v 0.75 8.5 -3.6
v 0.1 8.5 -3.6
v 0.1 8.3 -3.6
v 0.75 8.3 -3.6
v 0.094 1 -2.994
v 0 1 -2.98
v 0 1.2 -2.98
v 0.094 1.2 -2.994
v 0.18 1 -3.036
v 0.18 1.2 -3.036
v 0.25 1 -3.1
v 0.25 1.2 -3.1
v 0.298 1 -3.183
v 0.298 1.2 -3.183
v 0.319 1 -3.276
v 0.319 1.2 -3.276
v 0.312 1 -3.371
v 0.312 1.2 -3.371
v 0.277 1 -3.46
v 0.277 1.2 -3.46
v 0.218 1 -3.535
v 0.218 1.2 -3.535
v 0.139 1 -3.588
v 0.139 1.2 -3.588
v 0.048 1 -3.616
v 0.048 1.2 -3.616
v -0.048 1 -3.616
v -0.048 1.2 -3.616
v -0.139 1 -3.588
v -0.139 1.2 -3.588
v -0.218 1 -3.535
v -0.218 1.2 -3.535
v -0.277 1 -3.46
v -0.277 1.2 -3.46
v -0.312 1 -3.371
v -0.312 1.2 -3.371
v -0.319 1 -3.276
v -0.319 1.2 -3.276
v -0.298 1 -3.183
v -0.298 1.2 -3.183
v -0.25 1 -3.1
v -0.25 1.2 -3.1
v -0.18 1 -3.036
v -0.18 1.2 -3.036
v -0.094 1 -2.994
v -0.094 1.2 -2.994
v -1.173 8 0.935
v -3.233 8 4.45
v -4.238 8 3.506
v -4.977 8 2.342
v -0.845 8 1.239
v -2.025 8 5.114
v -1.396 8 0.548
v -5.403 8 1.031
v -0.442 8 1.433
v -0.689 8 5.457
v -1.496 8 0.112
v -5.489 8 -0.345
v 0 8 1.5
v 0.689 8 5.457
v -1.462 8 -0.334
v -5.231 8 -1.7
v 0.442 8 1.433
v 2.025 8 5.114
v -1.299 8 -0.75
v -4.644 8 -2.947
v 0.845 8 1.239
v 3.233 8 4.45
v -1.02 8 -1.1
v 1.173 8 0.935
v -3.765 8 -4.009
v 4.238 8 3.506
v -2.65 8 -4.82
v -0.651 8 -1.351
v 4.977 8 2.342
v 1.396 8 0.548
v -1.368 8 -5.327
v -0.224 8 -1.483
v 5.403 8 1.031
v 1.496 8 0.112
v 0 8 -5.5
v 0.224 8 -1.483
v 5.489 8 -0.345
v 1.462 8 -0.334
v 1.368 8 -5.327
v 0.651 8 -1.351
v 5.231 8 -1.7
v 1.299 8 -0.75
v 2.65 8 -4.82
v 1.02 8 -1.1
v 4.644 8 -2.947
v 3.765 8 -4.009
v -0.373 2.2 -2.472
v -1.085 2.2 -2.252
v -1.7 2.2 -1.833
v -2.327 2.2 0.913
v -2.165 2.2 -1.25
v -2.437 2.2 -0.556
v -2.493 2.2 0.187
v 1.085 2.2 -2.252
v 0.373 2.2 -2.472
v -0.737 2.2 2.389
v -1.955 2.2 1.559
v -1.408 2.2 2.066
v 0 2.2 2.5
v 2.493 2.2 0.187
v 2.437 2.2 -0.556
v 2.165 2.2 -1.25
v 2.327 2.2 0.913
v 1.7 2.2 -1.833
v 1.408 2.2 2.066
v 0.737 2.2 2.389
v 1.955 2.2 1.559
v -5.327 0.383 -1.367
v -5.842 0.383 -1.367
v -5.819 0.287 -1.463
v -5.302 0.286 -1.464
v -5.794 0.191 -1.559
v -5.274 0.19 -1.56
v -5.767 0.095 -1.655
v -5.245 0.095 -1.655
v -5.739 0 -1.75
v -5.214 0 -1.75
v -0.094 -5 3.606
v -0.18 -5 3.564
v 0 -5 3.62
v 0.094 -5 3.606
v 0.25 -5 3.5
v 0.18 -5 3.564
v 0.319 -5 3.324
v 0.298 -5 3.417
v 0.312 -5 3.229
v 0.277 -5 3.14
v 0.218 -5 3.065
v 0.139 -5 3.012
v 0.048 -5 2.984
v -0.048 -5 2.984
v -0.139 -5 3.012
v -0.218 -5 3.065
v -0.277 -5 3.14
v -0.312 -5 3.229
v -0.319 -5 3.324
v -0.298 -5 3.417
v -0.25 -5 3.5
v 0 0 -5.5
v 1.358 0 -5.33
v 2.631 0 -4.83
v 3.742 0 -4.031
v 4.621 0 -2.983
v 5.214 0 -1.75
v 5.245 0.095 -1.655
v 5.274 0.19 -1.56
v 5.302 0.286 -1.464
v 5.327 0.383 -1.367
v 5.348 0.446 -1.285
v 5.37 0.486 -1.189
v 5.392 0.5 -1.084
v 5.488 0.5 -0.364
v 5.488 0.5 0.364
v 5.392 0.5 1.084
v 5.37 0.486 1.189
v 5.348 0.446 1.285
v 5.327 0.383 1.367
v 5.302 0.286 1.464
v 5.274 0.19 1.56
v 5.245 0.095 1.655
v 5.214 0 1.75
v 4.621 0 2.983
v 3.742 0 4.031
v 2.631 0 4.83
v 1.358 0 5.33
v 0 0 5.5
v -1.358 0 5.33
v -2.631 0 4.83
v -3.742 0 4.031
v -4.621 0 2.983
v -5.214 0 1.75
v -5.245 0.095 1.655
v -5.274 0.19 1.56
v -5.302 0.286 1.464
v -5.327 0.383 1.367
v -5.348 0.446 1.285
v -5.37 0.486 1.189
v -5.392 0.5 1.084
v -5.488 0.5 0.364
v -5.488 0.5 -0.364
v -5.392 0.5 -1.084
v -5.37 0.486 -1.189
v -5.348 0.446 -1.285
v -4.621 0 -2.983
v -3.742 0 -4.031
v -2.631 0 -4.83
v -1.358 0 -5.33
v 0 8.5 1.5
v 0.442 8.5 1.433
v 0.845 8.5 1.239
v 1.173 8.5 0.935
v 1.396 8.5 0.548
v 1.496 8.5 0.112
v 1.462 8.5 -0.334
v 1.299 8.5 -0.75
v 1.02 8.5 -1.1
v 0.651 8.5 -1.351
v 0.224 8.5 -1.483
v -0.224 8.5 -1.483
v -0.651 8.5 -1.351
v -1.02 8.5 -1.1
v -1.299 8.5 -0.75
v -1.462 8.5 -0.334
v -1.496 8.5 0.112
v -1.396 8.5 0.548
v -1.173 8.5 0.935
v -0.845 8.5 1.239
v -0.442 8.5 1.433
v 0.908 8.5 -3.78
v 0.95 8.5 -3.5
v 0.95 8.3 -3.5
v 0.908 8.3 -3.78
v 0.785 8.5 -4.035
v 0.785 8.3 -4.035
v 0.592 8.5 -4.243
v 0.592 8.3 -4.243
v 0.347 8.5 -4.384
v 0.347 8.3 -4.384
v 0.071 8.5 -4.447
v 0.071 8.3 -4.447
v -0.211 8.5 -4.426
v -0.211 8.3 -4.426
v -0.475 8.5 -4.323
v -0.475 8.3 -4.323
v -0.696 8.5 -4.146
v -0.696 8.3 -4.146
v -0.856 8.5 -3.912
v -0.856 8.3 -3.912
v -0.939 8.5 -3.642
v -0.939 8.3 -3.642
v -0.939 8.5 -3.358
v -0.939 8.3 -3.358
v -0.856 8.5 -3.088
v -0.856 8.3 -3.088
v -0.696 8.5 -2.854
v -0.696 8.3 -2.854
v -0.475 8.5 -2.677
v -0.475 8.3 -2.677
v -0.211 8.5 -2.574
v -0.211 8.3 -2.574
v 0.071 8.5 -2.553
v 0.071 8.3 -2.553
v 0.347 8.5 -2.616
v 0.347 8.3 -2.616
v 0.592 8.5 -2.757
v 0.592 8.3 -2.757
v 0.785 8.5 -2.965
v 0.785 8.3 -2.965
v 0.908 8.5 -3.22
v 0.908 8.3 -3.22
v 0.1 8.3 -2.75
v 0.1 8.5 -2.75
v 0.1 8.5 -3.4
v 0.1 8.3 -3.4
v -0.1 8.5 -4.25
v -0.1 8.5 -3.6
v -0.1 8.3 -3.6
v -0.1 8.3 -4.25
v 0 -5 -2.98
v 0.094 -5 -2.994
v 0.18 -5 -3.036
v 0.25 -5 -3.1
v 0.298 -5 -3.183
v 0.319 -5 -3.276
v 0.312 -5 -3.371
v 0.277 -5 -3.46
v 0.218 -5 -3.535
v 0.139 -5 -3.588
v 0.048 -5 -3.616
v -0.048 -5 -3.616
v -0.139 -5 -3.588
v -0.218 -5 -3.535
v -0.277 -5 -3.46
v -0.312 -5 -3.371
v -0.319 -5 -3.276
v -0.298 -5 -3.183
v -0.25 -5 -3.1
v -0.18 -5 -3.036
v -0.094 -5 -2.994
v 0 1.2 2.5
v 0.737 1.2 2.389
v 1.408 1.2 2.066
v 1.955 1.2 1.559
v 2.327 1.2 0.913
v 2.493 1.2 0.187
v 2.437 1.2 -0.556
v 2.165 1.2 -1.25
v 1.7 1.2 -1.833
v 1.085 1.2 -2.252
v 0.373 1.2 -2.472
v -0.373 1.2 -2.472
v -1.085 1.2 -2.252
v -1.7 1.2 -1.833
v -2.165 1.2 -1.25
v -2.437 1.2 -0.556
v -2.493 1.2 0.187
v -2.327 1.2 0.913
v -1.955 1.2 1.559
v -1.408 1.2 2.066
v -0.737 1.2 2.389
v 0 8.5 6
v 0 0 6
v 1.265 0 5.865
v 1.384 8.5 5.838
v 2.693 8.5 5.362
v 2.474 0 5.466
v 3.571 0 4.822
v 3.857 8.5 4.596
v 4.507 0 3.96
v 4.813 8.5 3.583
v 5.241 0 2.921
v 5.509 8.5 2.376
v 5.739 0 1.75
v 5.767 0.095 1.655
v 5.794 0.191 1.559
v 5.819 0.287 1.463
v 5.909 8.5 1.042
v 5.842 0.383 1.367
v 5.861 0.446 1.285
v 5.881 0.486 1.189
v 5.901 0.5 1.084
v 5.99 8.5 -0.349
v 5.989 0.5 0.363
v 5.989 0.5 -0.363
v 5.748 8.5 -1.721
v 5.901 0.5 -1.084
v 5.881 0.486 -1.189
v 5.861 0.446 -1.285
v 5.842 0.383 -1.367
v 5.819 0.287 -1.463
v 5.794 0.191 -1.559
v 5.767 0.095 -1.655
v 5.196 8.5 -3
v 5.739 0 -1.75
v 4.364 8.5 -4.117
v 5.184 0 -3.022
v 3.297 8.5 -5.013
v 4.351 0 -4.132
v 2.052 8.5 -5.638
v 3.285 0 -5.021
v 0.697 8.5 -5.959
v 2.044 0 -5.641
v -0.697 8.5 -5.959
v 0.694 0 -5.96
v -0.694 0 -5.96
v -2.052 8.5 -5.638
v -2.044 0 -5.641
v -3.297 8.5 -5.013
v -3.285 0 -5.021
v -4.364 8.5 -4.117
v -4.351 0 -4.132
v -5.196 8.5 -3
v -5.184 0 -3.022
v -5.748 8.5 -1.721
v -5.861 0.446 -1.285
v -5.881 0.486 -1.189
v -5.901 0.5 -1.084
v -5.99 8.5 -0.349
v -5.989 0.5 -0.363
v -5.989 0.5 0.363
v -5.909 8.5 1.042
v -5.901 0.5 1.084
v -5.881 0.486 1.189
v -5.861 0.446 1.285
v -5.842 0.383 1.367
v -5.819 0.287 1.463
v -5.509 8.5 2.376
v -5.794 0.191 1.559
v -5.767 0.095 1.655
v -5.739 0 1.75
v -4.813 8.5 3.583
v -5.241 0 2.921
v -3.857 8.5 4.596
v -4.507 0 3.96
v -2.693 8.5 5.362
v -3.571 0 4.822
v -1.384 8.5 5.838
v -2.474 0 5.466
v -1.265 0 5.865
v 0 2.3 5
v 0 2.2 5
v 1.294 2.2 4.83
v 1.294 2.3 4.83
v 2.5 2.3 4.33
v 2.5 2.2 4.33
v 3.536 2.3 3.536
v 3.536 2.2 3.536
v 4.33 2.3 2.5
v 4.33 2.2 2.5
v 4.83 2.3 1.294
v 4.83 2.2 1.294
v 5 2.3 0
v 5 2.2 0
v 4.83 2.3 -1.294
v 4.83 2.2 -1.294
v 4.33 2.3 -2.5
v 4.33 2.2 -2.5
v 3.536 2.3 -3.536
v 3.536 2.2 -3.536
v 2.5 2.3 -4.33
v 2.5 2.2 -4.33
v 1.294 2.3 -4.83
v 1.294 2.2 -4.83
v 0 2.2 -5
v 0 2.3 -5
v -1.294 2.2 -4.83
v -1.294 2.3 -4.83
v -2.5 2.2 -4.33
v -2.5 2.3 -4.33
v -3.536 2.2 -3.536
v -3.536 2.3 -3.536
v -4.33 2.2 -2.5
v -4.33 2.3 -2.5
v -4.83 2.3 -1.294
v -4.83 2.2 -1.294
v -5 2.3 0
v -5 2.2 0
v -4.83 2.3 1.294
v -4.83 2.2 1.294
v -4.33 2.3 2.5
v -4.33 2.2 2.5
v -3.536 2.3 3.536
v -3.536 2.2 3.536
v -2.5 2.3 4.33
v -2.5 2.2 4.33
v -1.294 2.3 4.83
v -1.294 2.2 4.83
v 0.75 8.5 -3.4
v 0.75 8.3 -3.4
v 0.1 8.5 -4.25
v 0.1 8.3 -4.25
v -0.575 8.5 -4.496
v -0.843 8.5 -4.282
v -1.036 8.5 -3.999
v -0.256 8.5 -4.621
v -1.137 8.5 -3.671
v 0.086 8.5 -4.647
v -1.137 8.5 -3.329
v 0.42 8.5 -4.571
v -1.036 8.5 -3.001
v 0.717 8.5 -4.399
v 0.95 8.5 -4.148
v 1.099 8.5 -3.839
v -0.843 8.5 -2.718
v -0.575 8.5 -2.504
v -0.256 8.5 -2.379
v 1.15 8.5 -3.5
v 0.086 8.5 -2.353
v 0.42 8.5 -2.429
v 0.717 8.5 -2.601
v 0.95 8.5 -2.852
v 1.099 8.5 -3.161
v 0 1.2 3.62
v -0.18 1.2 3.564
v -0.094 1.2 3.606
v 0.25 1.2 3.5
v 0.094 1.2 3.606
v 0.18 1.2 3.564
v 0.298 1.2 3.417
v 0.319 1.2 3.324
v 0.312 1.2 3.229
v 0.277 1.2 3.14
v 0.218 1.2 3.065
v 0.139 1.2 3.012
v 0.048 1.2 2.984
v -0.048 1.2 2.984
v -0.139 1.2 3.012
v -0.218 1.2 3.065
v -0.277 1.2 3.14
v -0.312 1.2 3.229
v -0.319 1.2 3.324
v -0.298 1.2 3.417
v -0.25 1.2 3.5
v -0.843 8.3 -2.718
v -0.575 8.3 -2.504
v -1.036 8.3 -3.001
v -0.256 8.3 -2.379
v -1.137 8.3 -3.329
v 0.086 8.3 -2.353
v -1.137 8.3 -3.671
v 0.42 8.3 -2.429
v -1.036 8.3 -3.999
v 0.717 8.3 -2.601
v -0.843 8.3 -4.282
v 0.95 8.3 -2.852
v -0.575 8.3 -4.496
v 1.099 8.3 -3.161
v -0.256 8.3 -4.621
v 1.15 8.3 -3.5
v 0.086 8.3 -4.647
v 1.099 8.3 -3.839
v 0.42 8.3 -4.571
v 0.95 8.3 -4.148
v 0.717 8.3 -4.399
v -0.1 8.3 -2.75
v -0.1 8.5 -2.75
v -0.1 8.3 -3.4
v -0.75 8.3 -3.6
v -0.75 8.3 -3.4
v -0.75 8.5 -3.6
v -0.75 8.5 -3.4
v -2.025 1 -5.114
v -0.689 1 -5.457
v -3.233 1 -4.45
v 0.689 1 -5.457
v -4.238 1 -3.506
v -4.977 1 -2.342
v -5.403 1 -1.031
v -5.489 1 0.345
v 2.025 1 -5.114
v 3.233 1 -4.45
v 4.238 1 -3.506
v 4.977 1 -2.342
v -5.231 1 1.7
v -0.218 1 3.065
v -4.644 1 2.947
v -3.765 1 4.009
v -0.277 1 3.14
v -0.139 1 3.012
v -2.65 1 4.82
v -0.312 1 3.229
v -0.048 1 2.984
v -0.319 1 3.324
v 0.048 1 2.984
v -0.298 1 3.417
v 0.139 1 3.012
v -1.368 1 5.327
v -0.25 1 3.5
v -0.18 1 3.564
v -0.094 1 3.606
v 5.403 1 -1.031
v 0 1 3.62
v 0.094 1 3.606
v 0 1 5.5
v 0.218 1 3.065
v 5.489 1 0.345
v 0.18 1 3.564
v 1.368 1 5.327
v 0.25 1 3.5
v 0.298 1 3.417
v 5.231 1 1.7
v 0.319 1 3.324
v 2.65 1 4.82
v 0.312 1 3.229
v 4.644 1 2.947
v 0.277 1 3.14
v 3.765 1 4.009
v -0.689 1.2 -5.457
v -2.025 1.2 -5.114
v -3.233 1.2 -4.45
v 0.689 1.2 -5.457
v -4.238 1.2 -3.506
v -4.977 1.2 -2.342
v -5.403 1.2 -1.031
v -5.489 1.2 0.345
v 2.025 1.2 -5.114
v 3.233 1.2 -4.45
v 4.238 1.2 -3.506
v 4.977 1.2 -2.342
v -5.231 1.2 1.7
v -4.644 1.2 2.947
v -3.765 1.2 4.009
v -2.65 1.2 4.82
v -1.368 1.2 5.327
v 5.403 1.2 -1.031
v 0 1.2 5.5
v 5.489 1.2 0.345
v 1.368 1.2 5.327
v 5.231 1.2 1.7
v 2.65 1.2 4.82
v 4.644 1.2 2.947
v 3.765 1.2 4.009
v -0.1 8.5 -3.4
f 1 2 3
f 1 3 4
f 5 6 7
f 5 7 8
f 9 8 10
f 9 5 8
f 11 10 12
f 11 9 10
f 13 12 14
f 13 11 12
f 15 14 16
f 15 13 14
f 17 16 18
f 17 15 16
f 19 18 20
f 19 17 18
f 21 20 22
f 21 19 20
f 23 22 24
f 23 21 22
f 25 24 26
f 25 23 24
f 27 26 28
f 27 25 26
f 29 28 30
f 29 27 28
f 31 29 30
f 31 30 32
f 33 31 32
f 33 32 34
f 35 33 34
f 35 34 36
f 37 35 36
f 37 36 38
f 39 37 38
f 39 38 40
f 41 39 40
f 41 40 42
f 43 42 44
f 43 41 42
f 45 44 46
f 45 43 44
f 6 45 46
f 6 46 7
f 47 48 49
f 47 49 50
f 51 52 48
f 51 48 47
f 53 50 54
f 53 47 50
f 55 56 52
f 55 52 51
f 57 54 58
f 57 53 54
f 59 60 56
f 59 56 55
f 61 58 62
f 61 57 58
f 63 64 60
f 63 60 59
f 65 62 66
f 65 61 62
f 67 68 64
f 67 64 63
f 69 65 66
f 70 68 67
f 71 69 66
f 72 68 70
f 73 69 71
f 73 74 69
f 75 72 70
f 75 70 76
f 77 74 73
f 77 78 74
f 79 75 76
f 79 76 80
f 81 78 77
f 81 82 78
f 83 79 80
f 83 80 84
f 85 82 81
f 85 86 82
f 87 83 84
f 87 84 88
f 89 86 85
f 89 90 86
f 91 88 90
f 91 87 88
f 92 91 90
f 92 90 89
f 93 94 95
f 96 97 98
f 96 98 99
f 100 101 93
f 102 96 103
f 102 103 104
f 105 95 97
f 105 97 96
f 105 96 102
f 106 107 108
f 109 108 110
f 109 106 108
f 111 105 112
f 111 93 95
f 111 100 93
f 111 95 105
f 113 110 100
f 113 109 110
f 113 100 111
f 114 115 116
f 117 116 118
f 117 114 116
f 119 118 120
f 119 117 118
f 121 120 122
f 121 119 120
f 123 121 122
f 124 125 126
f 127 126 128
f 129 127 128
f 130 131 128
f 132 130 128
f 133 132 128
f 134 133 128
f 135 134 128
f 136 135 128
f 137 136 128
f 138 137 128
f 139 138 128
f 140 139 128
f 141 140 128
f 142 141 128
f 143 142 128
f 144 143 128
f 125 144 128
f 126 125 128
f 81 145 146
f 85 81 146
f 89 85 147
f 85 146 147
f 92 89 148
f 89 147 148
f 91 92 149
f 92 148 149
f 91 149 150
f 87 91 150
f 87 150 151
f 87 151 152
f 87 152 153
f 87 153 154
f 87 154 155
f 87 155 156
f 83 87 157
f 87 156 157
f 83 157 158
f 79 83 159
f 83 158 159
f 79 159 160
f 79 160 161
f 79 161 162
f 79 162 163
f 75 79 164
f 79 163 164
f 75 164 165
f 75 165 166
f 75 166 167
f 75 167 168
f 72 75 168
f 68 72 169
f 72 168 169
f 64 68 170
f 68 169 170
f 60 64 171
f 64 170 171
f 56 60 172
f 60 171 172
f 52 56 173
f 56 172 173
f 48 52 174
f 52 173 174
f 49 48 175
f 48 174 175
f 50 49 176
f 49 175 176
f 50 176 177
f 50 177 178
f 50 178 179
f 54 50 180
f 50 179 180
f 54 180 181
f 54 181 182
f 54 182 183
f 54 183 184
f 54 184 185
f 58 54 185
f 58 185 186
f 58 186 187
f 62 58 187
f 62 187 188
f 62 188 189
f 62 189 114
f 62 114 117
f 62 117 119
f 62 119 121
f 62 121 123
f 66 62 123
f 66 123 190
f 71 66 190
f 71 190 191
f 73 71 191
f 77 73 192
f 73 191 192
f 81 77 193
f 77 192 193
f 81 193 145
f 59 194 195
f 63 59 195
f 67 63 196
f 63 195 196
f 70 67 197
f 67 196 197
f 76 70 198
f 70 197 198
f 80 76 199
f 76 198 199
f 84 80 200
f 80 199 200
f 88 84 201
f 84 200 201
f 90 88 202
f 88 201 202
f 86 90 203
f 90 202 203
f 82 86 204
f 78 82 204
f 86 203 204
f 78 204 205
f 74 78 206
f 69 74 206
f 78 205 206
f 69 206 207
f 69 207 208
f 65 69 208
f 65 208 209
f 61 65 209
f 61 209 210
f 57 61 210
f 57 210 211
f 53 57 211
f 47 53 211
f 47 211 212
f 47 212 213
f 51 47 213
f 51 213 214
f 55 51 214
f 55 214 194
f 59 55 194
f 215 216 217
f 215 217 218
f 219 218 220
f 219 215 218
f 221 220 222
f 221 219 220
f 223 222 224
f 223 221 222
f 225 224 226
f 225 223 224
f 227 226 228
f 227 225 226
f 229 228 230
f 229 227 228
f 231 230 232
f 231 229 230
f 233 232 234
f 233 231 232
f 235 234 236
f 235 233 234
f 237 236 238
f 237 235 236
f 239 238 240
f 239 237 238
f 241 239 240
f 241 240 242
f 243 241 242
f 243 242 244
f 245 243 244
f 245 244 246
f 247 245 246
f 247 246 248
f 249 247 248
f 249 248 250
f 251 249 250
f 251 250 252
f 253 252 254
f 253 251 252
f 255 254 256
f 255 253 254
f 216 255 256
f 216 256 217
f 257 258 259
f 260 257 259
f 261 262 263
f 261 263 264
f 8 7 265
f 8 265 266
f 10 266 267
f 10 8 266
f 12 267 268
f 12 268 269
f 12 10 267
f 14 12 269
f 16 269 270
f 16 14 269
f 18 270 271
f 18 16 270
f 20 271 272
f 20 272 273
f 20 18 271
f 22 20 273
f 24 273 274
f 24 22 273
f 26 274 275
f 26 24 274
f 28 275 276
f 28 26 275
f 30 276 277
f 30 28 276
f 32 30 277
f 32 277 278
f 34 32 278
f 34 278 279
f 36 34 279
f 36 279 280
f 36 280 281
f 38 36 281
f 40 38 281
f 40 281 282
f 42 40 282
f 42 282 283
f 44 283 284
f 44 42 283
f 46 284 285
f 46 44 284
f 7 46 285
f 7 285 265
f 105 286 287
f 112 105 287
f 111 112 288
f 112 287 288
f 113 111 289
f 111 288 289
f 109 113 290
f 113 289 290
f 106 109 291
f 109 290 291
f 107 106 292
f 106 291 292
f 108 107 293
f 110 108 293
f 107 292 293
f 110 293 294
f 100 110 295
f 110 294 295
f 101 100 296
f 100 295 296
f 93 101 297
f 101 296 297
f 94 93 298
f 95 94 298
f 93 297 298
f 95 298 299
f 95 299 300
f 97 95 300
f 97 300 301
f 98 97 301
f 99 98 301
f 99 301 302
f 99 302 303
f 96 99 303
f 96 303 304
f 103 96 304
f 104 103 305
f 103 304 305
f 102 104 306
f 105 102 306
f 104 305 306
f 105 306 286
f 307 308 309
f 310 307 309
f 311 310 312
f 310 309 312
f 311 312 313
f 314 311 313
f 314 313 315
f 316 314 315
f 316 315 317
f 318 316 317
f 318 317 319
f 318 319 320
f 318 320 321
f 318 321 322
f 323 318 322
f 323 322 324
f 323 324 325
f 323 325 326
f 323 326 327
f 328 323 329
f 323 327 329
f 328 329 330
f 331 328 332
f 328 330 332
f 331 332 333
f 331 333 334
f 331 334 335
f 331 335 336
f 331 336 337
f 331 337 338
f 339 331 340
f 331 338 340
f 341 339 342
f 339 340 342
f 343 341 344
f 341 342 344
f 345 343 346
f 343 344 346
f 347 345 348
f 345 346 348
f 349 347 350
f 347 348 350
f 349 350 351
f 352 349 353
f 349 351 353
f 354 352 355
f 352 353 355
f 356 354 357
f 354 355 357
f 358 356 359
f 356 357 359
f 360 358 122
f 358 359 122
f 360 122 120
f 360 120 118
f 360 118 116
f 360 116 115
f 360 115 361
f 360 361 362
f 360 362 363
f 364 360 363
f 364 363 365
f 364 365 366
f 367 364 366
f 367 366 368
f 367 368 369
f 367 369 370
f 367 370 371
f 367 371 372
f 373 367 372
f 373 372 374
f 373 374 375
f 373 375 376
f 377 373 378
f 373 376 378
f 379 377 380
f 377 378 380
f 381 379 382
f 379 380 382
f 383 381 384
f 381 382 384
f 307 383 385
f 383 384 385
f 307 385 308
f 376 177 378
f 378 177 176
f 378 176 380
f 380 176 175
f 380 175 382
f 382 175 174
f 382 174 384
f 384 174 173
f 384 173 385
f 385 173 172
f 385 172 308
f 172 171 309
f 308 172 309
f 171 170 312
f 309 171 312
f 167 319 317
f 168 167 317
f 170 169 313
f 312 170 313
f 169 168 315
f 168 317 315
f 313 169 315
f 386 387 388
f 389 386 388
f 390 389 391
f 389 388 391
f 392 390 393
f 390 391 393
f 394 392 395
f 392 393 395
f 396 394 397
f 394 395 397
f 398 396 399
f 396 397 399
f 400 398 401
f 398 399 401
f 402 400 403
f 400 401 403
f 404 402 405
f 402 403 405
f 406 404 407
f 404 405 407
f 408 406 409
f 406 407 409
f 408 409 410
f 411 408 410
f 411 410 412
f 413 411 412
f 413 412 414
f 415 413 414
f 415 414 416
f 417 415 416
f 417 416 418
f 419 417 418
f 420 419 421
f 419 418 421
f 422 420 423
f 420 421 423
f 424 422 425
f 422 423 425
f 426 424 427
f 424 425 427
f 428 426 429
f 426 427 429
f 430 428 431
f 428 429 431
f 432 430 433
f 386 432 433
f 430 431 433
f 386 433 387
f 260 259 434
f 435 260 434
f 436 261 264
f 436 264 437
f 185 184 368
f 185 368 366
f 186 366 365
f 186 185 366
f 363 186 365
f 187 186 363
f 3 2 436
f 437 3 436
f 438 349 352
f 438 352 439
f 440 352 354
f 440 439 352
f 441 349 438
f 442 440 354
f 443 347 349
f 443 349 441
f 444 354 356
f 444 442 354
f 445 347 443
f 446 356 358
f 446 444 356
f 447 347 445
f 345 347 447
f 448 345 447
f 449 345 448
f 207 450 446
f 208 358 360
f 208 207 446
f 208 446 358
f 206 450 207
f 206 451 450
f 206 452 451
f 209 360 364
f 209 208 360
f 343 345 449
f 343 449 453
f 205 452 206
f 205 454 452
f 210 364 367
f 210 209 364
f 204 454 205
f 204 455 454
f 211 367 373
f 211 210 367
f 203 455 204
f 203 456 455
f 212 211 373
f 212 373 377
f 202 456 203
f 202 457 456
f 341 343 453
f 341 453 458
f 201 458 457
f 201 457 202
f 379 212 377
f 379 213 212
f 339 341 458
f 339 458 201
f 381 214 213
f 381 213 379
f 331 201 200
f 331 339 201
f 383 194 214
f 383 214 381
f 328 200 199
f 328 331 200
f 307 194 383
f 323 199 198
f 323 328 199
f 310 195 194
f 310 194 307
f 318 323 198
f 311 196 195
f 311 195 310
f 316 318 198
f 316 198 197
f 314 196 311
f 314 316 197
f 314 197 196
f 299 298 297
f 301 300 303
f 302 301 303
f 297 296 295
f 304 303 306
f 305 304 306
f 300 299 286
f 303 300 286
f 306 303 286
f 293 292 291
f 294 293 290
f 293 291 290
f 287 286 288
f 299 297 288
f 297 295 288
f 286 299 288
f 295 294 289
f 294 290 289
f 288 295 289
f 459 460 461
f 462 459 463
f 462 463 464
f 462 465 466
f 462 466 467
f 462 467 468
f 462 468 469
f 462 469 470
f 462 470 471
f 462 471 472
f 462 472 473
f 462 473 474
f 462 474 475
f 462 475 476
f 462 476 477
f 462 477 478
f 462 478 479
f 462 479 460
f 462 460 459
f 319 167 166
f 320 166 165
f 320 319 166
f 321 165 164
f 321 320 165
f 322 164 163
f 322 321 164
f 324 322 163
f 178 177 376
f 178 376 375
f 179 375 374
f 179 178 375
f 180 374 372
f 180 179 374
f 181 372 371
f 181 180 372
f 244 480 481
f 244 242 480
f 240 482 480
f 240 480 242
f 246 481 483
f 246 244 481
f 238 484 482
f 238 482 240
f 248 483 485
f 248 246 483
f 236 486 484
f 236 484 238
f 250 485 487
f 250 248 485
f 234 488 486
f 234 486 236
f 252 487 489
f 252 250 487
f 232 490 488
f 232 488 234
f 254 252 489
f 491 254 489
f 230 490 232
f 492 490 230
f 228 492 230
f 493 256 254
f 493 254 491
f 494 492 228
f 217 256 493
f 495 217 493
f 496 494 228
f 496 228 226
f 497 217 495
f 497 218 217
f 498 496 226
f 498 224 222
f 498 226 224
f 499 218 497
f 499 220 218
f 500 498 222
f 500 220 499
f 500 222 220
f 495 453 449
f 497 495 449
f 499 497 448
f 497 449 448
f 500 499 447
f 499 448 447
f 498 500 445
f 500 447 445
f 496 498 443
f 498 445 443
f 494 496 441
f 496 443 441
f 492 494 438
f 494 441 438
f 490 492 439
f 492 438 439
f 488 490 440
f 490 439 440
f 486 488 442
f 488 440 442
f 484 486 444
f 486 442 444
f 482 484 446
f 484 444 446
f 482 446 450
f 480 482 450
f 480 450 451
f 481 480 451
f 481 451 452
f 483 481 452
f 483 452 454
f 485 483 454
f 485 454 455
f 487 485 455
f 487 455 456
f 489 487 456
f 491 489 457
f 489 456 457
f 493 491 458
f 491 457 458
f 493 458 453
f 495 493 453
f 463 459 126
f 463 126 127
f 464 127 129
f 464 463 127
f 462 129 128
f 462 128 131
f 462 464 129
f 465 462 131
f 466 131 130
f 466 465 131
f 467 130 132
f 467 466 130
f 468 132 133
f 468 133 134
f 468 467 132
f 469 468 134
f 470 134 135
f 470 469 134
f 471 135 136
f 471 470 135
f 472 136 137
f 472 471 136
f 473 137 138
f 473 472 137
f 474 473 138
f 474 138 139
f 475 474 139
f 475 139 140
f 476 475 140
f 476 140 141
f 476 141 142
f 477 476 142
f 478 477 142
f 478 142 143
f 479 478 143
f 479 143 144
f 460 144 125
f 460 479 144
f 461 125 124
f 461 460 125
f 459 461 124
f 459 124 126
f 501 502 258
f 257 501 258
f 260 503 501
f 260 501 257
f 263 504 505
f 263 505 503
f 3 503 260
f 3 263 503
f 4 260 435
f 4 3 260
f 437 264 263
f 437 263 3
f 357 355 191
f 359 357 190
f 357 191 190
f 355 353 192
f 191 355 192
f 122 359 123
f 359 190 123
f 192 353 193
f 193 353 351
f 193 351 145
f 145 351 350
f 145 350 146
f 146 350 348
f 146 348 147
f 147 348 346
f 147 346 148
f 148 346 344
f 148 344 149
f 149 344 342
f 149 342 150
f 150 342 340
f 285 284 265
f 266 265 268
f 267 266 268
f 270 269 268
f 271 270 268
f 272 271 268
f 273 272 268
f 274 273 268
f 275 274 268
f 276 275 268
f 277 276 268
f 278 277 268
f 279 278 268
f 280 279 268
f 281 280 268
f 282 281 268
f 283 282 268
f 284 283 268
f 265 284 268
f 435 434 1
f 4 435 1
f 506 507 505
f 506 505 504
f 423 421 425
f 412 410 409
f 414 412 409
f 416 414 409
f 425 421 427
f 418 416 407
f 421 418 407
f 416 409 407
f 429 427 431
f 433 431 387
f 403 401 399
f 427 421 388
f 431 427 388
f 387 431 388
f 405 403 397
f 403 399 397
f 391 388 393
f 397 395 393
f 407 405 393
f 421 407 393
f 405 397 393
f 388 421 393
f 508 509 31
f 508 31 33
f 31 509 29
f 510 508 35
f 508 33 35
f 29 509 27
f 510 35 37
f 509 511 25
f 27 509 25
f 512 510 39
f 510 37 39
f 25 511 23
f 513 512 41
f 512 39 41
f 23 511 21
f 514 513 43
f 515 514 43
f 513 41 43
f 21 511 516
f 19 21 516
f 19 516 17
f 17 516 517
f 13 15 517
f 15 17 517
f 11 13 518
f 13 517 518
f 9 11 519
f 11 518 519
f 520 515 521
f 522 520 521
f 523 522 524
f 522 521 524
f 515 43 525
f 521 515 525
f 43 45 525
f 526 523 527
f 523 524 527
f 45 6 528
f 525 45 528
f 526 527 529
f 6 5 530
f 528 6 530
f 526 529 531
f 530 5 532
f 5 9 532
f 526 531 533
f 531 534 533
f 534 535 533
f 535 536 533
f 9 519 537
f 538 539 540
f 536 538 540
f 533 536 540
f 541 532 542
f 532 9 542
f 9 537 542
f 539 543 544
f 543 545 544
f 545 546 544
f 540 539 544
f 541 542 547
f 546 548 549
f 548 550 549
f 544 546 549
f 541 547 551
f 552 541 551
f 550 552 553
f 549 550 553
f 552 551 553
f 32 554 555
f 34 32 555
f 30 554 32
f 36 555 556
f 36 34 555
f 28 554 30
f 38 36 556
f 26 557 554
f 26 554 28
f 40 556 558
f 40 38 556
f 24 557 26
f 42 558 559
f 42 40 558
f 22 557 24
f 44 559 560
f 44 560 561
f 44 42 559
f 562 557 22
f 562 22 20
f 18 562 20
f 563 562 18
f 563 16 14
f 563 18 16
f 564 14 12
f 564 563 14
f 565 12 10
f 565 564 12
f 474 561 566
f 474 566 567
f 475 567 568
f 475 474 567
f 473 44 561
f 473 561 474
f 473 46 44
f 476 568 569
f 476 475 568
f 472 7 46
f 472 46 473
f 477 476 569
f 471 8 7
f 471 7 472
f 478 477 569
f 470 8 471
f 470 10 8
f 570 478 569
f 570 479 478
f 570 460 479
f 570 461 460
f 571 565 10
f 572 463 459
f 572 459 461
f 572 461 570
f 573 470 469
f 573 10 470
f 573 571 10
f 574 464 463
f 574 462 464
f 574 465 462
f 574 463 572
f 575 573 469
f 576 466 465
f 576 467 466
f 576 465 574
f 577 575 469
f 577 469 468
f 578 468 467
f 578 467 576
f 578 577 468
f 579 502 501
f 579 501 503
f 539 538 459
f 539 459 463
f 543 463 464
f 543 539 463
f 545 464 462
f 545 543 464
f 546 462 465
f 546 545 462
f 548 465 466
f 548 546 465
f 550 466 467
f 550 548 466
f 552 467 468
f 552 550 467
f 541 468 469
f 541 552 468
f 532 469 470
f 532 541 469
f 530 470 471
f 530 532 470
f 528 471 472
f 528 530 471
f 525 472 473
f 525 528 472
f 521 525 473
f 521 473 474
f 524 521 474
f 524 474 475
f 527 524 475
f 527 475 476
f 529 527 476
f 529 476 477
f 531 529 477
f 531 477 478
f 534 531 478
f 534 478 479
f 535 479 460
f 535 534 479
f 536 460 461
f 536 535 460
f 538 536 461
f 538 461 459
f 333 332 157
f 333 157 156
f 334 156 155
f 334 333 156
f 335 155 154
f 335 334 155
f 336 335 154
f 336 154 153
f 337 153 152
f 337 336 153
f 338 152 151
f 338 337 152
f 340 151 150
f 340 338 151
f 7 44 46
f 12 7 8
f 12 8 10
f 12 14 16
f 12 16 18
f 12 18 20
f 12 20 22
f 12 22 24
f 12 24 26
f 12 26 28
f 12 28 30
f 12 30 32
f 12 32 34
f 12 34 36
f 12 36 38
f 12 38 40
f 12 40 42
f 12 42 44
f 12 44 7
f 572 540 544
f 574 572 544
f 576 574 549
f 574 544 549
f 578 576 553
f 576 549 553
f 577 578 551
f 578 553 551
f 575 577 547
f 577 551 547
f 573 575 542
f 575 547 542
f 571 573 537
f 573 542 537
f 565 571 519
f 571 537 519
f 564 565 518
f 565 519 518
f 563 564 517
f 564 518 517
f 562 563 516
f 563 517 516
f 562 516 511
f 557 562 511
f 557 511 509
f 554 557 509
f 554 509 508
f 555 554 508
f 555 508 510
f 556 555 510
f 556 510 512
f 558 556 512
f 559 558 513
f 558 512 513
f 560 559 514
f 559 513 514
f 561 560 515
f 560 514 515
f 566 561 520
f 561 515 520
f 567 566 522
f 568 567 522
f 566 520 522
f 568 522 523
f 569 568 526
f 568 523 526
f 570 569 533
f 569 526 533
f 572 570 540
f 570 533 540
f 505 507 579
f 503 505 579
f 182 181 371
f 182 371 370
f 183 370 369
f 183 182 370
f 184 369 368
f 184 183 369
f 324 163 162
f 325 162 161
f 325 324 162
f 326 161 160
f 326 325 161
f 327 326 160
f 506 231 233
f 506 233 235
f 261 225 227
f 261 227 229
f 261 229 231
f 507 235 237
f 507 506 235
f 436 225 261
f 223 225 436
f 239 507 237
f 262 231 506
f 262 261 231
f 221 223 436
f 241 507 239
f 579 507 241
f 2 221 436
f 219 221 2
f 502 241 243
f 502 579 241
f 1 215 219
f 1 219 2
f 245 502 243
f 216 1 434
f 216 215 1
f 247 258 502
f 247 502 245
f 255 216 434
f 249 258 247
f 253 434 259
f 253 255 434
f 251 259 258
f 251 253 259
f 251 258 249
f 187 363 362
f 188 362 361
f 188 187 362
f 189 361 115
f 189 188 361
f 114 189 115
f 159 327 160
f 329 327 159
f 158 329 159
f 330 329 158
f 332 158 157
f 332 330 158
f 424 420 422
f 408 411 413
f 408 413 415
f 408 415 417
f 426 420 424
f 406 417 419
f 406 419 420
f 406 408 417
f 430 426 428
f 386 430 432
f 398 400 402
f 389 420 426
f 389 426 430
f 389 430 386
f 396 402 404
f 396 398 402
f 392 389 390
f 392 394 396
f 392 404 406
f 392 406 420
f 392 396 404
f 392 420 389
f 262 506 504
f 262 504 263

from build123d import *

# Parameters (mm, degrees)
SKETCH1_R               = 6
BOSS_EXTRUDE1_DEPTH     = 8.5
SKETCH2_R               = 5.5
CUT_EXTRUDE1_DEPTH      = 8
CUT_EXTRUDE2_REACH      = 14.01
SKETCH3_R               = 1.5
SKETCH4_R               = 1.15
SKETCH4_R_2             = 0.95
SKETCH4_W               = 1.5
SKETCH4_H               = 0.2
SKETCH4_W_2             = 0.2
SKETCH4_H_2             = 1.5
CUT_EXTRUDE_THIN1_DEPTH = 0.2
CUT_EXTRUDE3_DEPTH      = 16.882380174
SKETCH6_R               = 5.5
SKETCH6_R_2             = 0.32
BOARD_EXTRUDE_DEPTH     = 0.2
SKETCH7_R               = 0.32
PINS_DEPTH              = 6.2
PINS_2_DEPTH            = 6.2
SKETCH8_R               = 2.5
QUARTZ_EXTRUDE_DEPTH    = 1
SKETCH9_R               = 5
PLATE_EXTRUDE_DEPTH     = 0.1


with BuildPart() as part:
    # Sketch1 → Boss-Extrude1 (new body)
    with BuildSketch(Plane(origin=(0, 0, 0), x_dir=(1, 0, 0), z_dir=(0, 1, 0))):
        with Locations(Location((0, 0, 0), (0, 0, 270))):
            Circle(SKETCH1_R)
    extrude(amount=BOSS_EXTRUDE1_DEPTH)

    # Sketch2 → Cut-Extrude1 (cut)
    with BuildSketch(Plane(origin=(0, 0, 0), x_dir=(-1, 0, 0), z_dir=(0, -1, 0))):
        with Locations(Location((0, 0, 0), (0, 0, 90))):
            Circle(SKETCH2_R)
    extrude(amount=-CUT_EXTRUDE1_DEPTH, mode=Mode.SUBTRACT)

    # Sketch3 → Cut-Extrude2 (cut, up to next)
    with BuildSketch(Plane(origin=(0, 8.5, 0), x_dir=(1, 0, 0), z_dir=(0, 1, 0)), mode=Mode.PRIVATE) as cut_extrude2_sk1:
        with Locations(Location((0, 0, 0), (0, 0, 270))):
            Circle(SKETCH3_R)
    cut_extrude2_tool1 = extrude(cut_extrude2_sk1.sketch, amount=-CUT_EXTRUDE2_REACH, mode=Mode.PRIVATE) & part.part
    add(cut_extrude2_tool1.solids().sort_by_distance((0, 8.5, 0))[0], mode=Mode.SUBTRACT)

    # Sketch4 → Cut-Extrude-Thin1 (cut)
    # profile 1 of 3: a face of its own
    with BuildSketch(Plane(origin=(0, 8.5, 0), x_dir=(1, 0, 0), z_dir=(0, 1, 0))):
        with Locations((0, 3.5)):
            Circle(SKETCH4_R)
        with Locations((0, 3.5)):
            Circle(SKETCH4_R_2, mode=Mode.SUBTRACT)
    # profile 2 of 3: a face of its own
    with BuildSketch(Plane(origin=(0, 8.5, 0), x_dir=(1, 0, 0), z_dir=(0, 1, 0))):
        with Locations((0, 3.5)):
            Rectangle(SKETCH4_W, SKETCH4_H)
    # profile 3 of 3: a face of its own
    with BuildSketch(Plane(origin=(0, 8.5, 0), x_dir=(1, 0, 0), z_dir=(0, 1, 0))):
        with Locations((0, 3.5)):
            Rectangle(SKETCH4_W_2, SKETCH4_H_2)
    extrude(amount=-CUT_EXTRUDE_THIN1_DEPTH, mode=Mode.SUBTRACT)

    # Sketch5 → Cut-Extrude3 (cut, through all)
    with BuildSketch(Plane(origin=(6, 0, 0), x_dir=(0, 0, -1), z_dir=(1, 0, 0))):
        with BuildLine():
            Line((-1.084314575, 0.5), (1.084314575, 0.5))
            ThreePointArc((1.084314575, 0.5), (1.237387948, 0.469551813), (1.367157288, 0.382842712))
            Line((1.367157288, 0.382842712), (1.75, 0))
            Line((1.75, 0), (-1.75, 0))
            Line((-1.75, 0), (-1.367157288, 0.382842712))
            ThreePointArc((-1.367157288, 0.382842712), (-1.237387948, 0.469551813), (-1.084314575, 0.5))
        make_face()
    extrude(amount=-CUT_EXTRUDE3_DEPTH, mode=Mode.SUBTRACT)


with BuildPart() as body_2:
    # Sketch6 → Board extrude (new body)
    with BuildSketch(Plane(origin=(0, 1, 0), x_dir=(1, 0, 0), z_dir=(0, 1, 0))):
        with Locations(Location((0, 0, 0), (0, 0, 270))):
            Circle(SKETCH6_R)
        with Locations(Location((0, 3.3, 0), (0, 0, 270))):
            Circle(SKETCH6_R_2, mode=Mode.SUBTRACT)
        with Locations(Location((0, -3.3, 0), (0, 0, 270))):
            Circle(SKETCH6_R_2, mode=Mode.SUBTRACT)
    extrude(amount=BOARD_EXTRUDE_DEPTH)


with BuildPart() as body_3:
    # Sketch7 → Pins (new body)
    with BuildSketch(Plane(origin=(0, 1.2, 0), x_dir=(1, 0, 0), z_dir=(0, 1, 0))):
        with Locations(Location((0, 3.3, 0), (0, 0, 270))):
            Circle(SKETCH7_R)
    extrude(amount=-PINS_DEPTH)


with BuildPart() as body_4:
    # Sketch7 → Pins 2 (new body)
    with BuildSketch(Plane(origin=(0, 1.2, 0), x_dir=(1, 0, 0), z_dir=(0, 1, 0))):
        with Locations(Location((0, -3.3, 0), (0, 0, 270))):
            Circle(SKETCH7_R)
    extrude(amount=-PINS_2_DEPTH)


with BuildPart() as body_5:
    # Sketch8 → Quartz extrude (new body)
    with BuildSketch(Plane(origin=(0, 1.2, 0), x_dir=(1, 0, 0), z_dir=(0, 1, 0))):
        with Locations(Location((0, 0, 0), (0, 0, 270))):
            Circle(SKETCH8_R)
    extrude(amount=QUARTZ_EXTRUDE_DEPTH)


with BuildPart() as body_6:
    # Sketch9 → Plate extrude (new body)
    with BuildSketch(Plane(origin=(0, 2.2, 0), x_dir=(1, 0, 0), z_dir=(0, 1, 0))):
        with Locations(Location((0, 0, 0), (0, 0, 270))):
            Circle(SKETCH9_R)
    extrude(amount=PLATE_EXTRUDE_DEPTH)


solid = Compound([part.part, body_2.part, body_3.part, body_4.part, body_5.part, body_6.part])
